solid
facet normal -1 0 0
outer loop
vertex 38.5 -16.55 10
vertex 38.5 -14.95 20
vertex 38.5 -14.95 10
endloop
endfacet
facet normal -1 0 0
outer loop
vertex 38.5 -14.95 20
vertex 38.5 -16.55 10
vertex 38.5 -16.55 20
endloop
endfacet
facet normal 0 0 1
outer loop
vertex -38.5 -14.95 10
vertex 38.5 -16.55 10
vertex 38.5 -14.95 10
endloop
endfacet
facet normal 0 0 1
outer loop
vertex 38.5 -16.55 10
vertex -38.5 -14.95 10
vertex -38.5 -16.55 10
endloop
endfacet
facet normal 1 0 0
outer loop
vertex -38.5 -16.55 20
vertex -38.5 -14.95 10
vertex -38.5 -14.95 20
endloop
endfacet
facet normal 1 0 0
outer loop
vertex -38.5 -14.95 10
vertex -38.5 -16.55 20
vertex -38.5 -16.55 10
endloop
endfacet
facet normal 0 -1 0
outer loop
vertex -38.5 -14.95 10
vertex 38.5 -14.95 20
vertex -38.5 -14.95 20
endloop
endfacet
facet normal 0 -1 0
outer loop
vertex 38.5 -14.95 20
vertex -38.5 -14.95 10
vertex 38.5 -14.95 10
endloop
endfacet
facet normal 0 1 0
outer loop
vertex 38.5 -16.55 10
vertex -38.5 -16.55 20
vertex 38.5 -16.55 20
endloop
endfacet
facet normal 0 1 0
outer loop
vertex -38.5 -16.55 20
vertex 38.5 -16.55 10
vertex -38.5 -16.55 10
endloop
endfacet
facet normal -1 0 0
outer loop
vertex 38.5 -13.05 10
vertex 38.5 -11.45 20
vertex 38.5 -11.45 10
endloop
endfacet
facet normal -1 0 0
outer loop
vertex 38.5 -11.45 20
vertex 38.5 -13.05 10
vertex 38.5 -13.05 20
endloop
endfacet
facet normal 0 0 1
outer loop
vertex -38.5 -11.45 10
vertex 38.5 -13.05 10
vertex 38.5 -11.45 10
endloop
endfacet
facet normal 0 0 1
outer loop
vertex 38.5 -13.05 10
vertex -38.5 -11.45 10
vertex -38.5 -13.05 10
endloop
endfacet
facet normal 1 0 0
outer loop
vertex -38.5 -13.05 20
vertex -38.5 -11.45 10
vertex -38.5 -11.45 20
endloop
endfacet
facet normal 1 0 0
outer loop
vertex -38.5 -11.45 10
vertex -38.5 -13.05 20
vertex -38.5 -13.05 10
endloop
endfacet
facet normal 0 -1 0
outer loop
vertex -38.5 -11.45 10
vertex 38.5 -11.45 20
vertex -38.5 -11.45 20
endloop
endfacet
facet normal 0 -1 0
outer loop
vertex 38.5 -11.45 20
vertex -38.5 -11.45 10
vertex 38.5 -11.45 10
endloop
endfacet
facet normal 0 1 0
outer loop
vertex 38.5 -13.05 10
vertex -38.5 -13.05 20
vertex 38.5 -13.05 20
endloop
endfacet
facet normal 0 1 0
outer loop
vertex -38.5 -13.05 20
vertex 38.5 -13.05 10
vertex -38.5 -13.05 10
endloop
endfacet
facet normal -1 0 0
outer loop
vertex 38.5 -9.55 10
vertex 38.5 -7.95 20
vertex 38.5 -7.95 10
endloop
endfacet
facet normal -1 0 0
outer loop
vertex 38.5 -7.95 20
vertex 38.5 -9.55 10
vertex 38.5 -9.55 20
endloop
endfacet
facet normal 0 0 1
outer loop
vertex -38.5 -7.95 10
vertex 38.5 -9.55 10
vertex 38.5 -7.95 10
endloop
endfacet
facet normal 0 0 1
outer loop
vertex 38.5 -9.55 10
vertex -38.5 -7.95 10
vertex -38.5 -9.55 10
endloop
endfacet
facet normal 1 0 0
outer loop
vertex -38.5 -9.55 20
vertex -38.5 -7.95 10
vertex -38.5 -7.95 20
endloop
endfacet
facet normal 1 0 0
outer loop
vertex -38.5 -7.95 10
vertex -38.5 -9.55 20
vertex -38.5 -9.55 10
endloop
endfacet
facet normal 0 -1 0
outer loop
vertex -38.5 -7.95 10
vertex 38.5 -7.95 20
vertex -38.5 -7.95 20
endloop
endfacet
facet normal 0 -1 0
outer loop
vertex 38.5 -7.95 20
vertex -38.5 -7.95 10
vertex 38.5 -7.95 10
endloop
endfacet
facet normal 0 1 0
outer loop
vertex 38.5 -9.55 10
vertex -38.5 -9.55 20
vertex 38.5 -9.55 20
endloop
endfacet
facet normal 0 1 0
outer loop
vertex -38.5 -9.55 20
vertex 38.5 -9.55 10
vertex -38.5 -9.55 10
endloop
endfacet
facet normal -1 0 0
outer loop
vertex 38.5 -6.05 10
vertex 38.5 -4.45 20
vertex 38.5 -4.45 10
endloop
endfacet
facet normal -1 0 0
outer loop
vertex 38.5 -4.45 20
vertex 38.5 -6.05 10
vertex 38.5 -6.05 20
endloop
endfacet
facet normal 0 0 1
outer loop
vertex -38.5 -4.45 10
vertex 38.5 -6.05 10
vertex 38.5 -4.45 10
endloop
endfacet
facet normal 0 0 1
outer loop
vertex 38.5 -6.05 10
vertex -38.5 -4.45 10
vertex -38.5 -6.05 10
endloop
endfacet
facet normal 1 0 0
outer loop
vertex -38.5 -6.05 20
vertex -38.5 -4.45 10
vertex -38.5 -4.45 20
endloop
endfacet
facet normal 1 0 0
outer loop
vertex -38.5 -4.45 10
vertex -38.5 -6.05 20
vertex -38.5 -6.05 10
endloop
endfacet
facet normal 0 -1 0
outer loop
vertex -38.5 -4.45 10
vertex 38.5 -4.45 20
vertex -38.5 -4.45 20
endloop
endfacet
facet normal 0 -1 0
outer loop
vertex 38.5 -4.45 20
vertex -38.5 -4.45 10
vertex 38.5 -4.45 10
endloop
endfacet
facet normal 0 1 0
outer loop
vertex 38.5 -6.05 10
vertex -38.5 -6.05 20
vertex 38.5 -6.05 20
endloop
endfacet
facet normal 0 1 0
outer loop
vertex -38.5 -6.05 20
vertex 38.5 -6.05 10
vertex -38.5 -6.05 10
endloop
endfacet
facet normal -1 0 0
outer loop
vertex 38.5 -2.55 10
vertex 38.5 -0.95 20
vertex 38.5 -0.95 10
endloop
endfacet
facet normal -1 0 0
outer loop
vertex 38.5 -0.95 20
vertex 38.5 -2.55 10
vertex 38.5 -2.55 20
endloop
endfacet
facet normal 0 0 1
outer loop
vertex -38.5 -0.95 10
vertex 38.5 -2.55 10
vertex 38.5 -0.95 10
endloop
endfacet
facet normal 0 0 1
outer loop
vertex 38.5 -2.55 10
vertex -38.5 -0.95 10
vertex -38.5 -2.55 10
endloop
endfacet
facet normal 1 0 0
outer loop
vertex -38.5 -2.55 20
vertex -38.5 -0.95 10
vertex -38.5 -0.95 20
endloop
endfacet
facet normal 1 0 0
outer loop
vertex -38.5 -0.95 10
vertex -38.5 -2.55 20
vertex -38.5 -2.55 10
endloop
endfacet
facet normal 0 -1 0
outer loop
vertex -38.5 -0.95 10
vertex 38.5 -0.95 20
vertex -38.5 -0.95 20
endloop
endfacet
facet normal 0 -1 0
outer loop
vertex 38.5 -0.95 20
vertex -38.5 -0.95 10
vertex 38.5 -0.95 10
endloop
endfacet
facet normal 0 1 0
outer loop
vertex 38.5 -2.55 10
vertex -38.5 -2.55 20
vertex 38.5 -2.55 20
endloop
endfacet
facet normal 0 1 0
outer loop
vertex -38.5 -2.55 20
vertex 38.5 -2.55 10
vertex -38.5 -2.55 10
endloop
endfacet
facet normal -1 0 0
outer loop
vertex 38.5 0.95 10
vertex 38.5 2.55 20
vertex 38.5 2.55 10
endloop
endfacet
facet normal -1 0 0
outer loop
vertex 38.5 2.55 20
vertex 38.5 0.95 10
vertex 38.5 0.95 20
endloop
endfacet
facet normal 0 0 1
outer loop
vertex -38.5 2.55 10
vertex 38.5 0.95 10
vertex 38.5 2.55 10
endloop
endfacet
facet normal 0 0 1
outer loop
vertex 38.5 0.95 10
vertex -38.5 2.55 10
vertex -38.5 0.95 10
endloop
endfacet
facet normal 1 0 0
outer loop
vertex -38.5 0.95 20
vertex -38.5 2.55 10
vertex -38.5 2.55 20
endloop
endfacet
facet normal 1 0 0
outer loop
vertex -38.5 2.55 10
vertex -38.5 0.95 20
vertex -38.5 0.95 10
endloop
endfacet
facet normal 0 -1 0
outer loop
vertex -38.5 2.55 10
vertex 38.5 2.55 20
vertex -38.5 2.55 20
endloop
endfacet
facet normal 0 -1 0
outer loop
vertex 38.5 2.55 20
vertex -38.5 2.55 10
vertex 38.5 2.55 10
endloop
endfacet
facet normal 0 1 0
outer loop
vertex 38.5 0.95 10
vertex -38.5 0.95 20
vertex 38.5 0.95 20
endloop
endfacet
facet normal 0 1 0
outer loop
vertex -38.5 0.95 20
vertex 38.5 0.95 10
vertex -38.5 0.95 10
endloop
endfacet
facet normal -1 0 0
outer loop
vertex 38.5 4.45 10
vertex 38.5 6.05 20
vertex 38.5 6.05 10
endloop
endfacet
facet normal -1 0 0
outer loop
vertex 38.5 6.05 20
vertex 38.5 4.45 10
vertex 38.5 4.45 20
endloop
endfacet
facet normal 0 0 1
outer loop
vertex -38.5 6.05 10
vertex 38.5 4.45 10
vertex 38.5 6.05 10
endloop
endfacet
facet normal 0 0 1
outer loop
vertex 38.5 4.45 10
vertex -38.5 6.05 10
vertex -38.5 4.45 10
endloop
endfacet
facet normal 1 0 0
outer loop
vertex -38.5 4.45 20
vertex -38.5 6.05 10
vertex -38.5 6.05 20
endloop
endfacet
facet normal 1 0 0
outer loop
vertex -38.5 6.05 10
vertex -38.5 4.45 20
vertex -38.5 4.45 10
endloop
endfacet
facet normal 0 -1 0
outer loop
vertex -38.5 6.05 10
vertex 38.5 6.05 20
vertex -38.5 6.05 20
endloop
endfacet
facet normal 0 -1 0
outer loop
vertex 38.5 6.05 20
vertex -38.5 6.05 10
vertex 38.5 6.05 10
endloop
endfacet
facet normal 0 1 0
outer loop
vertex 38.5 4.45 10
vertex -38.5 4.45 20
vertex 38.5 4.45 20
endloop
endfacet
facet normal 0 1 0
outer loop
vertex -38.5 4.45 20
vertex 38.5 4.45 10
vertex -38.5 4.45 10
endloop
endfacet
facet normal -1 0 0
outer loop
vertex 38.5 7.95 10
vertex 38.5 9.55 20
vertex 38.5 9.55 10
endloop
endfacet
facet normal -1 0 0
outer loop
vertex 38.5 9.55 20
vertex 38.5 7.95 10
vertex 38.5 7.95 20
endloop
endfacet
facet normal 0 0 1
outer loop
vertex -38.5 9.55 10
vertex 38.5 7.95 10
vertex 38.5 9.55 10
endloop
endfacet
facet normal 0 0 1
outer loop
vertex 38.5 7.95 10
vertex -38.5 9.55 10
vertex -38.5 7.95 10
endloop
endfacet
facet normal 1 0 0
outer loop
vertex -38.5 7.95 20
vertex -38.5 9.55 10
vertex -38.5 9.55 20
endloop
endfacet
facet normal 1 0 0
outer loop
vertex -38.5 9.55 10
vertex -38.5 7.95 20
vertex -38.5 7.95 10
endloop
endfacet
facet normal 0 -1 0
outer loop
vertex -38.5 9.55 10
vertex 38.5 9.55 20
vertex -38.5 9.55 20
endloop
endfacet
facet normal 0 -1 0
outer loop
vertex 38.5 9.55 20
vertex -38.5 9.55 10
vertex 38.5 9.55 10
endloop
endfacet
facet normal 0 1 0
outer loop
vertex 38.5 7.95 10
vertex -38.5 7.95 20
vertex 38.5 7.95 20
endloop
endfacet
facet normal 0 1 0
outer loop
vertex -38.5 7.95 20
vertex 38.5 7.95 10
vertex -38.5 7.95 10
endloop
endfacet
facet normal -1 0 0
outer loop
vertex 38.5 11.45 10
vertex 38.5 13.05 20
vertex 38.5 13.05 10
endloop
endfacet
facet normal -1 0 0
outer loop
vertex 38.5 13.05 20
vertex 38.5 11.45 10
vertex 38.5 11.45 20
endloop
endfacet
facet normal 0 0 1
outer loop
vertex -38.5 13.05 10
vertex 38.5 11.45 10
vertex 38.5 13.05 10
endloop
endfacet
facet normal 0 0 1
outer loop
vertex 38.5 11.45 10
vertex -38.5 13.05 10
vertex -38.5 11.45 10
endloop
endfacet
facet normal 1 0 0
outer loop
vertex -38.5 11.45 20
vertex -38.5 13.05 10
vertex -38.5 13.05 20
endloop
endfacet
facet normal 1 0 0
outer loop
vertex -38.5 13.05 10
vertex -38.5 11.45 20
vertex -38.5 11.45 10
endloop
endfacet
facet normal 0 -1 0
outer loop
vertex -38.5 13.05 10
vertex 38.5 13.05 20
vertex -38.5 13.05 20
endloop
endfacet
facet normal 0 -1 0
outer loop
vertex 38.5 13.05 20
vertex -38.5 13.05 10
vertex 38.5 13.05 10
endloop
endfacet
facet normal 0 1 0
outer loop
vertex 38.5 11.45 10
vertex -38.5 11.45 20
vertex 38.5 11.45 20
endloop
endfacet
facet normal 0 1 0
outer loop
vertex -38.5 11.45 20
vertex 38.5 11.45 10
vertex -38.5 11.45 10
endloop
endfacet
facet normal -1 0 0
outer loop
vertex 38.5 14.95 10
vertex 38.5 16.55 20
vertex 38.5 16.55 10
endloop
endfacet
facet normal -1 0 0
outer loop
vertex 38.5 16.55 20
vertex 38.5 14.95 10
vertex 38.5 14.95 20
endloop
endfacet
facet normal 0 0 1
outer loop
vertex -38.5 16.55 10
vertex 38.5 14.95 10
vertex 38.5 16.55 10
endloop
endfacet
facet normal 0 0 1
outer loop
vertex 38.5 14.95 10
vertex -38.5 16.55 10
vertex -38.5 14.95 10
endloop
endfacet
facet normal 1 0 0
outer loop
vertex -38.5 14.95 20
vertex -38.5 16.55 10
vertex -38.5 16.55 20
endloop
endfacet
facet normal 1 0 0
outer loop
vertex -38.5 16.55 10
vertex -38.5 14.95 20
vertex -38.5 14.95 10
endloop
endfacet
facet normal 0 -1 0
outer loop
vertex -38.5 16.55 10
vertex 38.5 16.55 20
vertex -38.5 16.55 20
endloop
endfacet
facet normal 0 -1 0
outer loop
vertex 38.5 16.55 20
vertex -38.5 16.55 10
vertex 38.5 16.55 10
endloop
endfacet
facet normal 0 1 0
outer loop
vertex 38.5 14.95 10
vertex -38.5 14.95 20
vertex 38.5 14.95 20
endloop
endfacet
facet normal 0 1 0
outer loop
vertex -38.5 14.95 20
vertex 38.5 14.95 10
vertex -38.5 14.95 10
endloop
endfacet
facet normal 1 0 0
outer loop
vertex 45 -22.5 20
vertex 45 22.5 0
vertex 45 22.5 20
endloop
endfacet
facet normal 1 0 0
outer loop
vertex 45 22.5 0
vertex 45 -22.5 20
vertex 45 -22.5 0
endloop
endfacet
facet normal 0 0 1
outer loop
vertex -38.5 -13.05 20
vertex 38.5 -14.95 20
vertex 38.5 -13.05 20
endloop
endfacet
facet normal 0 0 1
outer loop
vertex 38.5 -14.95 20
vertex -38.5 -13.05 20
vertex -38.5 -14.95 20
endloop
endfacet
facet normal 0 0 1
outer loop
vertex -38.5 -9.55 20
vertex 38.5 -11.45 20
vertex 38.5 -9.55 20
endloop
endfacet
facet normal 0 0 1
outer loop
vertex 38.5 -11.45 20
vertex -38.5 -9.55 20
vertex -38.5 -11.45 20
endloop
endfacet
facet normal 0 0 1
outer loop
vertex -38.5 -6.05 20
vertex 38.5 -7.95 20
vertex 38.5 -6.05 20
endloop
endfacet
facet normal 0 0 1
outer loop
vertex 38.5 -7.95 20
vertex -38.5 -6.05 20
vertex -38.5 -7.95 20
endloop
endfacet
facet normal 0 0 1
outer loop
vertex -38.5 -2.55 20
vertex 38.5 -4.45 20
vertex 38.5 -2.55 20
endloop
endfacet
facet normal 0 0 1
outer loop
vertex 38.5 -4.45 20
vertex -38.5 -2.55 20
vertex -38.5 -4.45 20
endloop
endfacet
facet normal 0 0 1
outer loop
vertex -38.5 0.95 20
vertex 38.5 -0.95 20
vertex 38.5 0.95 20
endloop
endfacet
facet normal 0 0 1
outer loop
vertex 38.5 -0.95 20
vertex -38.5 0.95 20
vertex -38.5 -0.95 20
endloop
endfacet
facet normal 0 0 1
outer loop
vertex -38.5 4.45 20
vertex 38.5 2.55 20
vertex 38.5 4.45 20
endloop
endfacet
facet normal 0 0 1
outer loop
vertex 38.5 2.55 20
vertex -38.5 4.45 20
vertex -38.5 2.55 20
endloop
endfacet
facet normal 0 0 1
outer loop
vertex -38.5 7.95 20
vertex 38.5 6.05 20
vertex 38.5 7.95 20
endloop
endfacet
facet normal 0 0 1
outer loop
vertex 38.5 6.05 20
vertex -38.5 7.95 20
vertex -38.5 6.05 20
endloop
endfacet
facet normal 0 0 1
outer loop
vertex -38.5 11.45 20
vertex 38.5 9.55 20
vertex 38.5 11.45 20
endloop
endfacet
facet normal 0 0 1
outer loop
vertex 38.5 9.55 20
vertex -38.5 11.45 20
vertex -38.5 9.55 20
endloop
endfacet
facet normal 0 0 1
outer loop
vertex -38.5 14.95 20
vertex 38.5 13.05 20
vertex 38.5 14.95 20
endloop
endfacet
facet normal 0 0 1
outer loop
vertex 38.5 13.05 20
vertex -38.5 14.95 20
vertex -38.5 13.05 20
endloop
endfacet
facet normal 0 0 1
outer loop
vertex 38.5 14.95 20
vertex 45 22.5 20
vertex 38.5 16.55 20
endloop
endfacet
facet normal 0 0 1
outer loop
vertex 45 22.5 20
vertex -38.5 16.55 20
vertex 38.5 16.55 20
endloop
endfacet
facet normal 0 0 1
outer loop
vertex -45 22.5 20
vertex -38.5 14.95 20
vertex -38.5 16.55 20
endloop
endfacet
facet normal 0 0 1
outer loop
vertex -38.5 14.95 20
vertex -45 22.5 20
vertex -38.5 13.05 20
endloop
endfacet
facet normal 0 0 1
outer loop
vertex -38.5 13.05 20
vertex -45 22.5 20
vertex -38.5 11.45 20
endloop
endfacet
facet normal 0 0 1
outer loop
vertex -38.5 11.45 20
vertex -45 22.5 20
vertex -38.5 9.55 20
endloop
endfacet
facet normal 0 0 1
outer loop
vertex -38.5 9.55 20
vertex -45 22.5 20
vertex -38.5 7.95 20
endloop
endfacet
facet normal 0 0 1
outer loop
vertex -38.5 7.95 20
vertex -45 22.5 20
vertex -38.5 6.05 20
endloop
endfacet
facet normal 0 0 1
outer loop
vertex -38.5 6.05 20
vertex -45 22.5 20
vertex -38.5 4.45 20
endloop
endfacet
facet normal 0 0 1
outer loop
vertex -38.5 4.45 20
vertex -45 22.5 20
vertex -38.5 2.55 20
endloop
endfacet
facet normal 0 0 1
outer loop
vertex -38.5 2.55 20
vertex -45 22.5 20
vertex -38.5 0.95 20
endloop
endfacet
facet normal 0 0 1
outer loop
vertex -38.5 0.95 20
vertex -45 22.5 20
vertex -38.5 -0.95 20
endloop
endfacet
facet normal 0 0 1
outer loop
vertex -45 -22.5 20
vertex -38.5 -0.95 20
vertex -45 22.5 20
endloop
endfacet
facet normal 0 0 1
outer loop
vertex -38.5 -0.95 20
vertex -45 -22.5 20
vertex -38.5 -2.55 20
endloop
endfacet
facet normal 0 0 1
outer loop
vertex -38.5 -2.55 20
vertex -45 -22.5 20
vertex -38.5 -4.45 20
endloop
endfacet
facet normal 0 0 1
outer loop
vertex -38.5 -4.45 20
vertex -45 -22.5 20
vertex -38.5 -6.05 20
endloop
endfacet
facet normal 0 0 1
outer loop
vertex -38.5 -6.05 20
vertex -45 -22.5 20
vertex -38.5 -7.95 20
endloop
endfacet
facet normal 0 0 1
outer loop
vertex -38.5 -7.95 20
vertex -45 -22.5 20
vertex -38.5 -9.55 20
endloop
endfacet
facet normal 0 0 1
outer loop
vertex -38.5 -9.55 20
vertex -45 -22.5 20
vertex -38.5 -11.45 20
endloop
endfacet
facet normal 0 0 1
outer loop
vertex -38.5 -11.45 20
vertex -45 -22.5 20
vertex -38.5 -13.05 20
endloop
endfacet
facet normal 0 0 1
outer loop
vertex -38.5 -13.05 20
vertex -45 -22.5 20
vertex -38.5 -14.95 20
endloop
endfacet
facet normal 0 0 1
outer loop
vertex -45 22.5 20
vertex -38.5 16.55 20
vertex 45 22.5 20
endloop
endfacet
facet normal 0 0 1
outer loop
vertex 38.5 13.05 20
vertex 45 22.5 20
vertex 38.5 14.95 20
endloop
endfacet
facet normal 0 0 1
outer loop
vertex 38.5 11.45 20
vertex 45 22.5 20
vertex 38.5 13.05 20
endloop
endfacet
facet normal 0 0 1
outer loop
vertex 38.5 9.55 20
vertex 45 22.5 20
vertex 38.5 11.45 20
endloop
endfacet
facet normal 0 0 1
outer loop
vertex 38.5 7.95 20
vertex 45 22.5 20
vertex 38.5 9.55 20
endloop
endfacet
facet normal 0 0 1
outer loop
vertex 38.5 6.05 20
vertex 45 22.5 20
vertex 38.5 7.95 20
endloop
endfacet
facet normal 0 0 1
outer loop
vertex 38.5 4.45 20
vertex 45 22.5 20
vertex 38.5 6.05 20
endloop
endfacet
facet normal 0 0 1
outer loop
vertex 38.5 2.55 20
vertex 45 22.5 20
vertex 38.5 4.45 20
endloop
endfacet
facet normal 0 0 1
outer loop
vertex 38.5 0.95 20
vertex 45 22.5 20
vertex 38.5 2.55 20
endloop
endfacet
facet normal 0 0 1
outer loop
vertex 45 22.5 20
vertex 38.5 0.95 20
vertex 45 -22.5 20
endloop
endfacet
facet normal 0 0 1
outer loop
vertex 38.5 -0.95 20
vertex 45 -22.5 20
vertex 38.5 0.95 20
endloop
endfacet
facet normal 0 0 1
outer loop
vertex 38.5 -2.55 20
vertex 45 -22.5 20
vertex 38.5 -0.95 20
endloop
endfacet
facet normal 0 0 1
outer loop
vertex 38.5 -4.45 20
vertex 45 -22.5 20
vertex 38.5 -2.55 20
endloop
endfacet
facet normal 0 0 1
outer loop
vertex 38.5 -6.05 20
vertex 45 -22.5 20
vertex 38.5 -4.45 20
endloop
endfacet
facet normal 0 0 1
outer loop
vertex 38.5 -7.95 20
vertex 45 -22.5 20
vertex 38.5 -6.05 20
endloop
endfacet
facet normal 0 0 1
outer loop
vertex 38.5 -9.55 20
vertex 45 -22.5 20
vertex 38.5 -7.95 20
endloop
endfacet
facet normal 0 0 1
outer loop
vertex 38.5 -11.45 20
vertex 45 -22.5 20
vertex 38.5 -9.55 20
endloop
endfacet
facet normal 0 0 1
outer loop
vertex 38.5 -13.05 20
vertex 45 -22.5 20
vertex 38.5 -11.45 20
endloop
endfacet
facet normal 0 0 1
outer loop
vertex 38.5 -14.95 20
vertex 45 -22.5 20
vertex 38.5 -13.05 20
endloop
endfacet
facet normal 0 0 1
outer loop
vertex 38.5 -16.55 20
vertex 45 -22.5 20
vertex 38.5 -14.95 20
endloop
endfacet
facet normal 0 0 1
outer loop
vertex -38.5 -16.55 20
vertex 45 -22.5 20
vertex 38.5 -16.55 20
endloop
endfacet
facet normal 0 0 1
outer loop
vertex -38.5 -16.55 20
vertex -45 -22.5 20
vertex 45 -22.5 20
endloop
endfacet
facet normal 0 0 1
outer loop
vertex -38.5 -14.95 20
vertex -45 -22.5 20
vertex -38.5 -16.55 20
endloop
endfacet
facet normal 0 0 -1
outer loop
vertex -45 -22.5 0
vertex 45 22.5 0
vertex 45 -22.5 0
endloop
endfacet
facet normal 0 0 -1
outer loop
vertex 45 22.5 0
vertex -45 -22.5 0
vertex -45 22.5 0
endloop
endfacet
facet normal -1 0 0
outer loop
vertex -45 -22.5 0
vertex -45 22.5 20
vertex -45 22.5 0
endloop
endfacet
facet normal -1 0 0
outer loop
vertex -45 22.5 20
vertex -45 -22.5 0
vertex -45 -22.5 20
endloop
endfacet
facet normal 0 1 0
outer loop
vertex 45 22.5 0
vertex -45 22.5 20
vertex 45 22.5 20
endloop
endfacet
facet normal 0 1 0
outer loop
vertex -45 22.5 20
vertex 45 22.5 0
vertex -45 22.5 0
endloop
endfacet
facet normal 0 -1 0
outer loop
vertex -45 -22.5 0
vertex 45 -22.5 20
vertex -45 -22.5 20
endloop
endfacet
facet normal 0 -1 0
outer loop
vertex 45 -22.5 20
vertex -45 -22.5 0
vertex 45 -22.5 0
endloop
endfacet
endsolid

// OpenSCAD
// Drying rack for 10 microscope slides (75 x 25 x 1 mm)
// Slides stand upright on their long edge, inserted into slots on the top face.

// --- Dimensions ---
base_L = 90;   // base block length (X)
base_W = 45;   // base block width (Y)
base_H = 20;   // base block height (Z)

slot_L = 77;   // slot length (X)
slot_W = 1.6;  // slot width (Y)
slot_D = 10;   // slot depth (Z)

n_slots = 10;  // number of slots
slot_pitch = 3.5; // centre-to-centre spacing in Y

// --- Build ---
$fn = 64;

// Base block, centred on origin in X and Y, resting on z=0
module base() {
    translate([-base_L/2, -base_W/2, 0])
        cube([base_L, base_W, base_H]);
}

// Slot cutter: a box running along X, open at the top face
module slot_cutter(yc) {
    // yc is the Y-centre of the slot
    // The cutter extends 0.5 mm above the top face to ensure a clean cut
    translate([-slot_L/2, yc - slot_W/2, base_H - slot_D])
        cube([slot_L, slot_W, slot_D + 0.5]);
}

// Final part: base minus all slots
difference() {
    base();
    for (i = [0 : n_slots - 1]) {
        yc = (i - (n_slots - 1) / 2) * slot_pitch;
        slot_cutter(yc);
    }
}
